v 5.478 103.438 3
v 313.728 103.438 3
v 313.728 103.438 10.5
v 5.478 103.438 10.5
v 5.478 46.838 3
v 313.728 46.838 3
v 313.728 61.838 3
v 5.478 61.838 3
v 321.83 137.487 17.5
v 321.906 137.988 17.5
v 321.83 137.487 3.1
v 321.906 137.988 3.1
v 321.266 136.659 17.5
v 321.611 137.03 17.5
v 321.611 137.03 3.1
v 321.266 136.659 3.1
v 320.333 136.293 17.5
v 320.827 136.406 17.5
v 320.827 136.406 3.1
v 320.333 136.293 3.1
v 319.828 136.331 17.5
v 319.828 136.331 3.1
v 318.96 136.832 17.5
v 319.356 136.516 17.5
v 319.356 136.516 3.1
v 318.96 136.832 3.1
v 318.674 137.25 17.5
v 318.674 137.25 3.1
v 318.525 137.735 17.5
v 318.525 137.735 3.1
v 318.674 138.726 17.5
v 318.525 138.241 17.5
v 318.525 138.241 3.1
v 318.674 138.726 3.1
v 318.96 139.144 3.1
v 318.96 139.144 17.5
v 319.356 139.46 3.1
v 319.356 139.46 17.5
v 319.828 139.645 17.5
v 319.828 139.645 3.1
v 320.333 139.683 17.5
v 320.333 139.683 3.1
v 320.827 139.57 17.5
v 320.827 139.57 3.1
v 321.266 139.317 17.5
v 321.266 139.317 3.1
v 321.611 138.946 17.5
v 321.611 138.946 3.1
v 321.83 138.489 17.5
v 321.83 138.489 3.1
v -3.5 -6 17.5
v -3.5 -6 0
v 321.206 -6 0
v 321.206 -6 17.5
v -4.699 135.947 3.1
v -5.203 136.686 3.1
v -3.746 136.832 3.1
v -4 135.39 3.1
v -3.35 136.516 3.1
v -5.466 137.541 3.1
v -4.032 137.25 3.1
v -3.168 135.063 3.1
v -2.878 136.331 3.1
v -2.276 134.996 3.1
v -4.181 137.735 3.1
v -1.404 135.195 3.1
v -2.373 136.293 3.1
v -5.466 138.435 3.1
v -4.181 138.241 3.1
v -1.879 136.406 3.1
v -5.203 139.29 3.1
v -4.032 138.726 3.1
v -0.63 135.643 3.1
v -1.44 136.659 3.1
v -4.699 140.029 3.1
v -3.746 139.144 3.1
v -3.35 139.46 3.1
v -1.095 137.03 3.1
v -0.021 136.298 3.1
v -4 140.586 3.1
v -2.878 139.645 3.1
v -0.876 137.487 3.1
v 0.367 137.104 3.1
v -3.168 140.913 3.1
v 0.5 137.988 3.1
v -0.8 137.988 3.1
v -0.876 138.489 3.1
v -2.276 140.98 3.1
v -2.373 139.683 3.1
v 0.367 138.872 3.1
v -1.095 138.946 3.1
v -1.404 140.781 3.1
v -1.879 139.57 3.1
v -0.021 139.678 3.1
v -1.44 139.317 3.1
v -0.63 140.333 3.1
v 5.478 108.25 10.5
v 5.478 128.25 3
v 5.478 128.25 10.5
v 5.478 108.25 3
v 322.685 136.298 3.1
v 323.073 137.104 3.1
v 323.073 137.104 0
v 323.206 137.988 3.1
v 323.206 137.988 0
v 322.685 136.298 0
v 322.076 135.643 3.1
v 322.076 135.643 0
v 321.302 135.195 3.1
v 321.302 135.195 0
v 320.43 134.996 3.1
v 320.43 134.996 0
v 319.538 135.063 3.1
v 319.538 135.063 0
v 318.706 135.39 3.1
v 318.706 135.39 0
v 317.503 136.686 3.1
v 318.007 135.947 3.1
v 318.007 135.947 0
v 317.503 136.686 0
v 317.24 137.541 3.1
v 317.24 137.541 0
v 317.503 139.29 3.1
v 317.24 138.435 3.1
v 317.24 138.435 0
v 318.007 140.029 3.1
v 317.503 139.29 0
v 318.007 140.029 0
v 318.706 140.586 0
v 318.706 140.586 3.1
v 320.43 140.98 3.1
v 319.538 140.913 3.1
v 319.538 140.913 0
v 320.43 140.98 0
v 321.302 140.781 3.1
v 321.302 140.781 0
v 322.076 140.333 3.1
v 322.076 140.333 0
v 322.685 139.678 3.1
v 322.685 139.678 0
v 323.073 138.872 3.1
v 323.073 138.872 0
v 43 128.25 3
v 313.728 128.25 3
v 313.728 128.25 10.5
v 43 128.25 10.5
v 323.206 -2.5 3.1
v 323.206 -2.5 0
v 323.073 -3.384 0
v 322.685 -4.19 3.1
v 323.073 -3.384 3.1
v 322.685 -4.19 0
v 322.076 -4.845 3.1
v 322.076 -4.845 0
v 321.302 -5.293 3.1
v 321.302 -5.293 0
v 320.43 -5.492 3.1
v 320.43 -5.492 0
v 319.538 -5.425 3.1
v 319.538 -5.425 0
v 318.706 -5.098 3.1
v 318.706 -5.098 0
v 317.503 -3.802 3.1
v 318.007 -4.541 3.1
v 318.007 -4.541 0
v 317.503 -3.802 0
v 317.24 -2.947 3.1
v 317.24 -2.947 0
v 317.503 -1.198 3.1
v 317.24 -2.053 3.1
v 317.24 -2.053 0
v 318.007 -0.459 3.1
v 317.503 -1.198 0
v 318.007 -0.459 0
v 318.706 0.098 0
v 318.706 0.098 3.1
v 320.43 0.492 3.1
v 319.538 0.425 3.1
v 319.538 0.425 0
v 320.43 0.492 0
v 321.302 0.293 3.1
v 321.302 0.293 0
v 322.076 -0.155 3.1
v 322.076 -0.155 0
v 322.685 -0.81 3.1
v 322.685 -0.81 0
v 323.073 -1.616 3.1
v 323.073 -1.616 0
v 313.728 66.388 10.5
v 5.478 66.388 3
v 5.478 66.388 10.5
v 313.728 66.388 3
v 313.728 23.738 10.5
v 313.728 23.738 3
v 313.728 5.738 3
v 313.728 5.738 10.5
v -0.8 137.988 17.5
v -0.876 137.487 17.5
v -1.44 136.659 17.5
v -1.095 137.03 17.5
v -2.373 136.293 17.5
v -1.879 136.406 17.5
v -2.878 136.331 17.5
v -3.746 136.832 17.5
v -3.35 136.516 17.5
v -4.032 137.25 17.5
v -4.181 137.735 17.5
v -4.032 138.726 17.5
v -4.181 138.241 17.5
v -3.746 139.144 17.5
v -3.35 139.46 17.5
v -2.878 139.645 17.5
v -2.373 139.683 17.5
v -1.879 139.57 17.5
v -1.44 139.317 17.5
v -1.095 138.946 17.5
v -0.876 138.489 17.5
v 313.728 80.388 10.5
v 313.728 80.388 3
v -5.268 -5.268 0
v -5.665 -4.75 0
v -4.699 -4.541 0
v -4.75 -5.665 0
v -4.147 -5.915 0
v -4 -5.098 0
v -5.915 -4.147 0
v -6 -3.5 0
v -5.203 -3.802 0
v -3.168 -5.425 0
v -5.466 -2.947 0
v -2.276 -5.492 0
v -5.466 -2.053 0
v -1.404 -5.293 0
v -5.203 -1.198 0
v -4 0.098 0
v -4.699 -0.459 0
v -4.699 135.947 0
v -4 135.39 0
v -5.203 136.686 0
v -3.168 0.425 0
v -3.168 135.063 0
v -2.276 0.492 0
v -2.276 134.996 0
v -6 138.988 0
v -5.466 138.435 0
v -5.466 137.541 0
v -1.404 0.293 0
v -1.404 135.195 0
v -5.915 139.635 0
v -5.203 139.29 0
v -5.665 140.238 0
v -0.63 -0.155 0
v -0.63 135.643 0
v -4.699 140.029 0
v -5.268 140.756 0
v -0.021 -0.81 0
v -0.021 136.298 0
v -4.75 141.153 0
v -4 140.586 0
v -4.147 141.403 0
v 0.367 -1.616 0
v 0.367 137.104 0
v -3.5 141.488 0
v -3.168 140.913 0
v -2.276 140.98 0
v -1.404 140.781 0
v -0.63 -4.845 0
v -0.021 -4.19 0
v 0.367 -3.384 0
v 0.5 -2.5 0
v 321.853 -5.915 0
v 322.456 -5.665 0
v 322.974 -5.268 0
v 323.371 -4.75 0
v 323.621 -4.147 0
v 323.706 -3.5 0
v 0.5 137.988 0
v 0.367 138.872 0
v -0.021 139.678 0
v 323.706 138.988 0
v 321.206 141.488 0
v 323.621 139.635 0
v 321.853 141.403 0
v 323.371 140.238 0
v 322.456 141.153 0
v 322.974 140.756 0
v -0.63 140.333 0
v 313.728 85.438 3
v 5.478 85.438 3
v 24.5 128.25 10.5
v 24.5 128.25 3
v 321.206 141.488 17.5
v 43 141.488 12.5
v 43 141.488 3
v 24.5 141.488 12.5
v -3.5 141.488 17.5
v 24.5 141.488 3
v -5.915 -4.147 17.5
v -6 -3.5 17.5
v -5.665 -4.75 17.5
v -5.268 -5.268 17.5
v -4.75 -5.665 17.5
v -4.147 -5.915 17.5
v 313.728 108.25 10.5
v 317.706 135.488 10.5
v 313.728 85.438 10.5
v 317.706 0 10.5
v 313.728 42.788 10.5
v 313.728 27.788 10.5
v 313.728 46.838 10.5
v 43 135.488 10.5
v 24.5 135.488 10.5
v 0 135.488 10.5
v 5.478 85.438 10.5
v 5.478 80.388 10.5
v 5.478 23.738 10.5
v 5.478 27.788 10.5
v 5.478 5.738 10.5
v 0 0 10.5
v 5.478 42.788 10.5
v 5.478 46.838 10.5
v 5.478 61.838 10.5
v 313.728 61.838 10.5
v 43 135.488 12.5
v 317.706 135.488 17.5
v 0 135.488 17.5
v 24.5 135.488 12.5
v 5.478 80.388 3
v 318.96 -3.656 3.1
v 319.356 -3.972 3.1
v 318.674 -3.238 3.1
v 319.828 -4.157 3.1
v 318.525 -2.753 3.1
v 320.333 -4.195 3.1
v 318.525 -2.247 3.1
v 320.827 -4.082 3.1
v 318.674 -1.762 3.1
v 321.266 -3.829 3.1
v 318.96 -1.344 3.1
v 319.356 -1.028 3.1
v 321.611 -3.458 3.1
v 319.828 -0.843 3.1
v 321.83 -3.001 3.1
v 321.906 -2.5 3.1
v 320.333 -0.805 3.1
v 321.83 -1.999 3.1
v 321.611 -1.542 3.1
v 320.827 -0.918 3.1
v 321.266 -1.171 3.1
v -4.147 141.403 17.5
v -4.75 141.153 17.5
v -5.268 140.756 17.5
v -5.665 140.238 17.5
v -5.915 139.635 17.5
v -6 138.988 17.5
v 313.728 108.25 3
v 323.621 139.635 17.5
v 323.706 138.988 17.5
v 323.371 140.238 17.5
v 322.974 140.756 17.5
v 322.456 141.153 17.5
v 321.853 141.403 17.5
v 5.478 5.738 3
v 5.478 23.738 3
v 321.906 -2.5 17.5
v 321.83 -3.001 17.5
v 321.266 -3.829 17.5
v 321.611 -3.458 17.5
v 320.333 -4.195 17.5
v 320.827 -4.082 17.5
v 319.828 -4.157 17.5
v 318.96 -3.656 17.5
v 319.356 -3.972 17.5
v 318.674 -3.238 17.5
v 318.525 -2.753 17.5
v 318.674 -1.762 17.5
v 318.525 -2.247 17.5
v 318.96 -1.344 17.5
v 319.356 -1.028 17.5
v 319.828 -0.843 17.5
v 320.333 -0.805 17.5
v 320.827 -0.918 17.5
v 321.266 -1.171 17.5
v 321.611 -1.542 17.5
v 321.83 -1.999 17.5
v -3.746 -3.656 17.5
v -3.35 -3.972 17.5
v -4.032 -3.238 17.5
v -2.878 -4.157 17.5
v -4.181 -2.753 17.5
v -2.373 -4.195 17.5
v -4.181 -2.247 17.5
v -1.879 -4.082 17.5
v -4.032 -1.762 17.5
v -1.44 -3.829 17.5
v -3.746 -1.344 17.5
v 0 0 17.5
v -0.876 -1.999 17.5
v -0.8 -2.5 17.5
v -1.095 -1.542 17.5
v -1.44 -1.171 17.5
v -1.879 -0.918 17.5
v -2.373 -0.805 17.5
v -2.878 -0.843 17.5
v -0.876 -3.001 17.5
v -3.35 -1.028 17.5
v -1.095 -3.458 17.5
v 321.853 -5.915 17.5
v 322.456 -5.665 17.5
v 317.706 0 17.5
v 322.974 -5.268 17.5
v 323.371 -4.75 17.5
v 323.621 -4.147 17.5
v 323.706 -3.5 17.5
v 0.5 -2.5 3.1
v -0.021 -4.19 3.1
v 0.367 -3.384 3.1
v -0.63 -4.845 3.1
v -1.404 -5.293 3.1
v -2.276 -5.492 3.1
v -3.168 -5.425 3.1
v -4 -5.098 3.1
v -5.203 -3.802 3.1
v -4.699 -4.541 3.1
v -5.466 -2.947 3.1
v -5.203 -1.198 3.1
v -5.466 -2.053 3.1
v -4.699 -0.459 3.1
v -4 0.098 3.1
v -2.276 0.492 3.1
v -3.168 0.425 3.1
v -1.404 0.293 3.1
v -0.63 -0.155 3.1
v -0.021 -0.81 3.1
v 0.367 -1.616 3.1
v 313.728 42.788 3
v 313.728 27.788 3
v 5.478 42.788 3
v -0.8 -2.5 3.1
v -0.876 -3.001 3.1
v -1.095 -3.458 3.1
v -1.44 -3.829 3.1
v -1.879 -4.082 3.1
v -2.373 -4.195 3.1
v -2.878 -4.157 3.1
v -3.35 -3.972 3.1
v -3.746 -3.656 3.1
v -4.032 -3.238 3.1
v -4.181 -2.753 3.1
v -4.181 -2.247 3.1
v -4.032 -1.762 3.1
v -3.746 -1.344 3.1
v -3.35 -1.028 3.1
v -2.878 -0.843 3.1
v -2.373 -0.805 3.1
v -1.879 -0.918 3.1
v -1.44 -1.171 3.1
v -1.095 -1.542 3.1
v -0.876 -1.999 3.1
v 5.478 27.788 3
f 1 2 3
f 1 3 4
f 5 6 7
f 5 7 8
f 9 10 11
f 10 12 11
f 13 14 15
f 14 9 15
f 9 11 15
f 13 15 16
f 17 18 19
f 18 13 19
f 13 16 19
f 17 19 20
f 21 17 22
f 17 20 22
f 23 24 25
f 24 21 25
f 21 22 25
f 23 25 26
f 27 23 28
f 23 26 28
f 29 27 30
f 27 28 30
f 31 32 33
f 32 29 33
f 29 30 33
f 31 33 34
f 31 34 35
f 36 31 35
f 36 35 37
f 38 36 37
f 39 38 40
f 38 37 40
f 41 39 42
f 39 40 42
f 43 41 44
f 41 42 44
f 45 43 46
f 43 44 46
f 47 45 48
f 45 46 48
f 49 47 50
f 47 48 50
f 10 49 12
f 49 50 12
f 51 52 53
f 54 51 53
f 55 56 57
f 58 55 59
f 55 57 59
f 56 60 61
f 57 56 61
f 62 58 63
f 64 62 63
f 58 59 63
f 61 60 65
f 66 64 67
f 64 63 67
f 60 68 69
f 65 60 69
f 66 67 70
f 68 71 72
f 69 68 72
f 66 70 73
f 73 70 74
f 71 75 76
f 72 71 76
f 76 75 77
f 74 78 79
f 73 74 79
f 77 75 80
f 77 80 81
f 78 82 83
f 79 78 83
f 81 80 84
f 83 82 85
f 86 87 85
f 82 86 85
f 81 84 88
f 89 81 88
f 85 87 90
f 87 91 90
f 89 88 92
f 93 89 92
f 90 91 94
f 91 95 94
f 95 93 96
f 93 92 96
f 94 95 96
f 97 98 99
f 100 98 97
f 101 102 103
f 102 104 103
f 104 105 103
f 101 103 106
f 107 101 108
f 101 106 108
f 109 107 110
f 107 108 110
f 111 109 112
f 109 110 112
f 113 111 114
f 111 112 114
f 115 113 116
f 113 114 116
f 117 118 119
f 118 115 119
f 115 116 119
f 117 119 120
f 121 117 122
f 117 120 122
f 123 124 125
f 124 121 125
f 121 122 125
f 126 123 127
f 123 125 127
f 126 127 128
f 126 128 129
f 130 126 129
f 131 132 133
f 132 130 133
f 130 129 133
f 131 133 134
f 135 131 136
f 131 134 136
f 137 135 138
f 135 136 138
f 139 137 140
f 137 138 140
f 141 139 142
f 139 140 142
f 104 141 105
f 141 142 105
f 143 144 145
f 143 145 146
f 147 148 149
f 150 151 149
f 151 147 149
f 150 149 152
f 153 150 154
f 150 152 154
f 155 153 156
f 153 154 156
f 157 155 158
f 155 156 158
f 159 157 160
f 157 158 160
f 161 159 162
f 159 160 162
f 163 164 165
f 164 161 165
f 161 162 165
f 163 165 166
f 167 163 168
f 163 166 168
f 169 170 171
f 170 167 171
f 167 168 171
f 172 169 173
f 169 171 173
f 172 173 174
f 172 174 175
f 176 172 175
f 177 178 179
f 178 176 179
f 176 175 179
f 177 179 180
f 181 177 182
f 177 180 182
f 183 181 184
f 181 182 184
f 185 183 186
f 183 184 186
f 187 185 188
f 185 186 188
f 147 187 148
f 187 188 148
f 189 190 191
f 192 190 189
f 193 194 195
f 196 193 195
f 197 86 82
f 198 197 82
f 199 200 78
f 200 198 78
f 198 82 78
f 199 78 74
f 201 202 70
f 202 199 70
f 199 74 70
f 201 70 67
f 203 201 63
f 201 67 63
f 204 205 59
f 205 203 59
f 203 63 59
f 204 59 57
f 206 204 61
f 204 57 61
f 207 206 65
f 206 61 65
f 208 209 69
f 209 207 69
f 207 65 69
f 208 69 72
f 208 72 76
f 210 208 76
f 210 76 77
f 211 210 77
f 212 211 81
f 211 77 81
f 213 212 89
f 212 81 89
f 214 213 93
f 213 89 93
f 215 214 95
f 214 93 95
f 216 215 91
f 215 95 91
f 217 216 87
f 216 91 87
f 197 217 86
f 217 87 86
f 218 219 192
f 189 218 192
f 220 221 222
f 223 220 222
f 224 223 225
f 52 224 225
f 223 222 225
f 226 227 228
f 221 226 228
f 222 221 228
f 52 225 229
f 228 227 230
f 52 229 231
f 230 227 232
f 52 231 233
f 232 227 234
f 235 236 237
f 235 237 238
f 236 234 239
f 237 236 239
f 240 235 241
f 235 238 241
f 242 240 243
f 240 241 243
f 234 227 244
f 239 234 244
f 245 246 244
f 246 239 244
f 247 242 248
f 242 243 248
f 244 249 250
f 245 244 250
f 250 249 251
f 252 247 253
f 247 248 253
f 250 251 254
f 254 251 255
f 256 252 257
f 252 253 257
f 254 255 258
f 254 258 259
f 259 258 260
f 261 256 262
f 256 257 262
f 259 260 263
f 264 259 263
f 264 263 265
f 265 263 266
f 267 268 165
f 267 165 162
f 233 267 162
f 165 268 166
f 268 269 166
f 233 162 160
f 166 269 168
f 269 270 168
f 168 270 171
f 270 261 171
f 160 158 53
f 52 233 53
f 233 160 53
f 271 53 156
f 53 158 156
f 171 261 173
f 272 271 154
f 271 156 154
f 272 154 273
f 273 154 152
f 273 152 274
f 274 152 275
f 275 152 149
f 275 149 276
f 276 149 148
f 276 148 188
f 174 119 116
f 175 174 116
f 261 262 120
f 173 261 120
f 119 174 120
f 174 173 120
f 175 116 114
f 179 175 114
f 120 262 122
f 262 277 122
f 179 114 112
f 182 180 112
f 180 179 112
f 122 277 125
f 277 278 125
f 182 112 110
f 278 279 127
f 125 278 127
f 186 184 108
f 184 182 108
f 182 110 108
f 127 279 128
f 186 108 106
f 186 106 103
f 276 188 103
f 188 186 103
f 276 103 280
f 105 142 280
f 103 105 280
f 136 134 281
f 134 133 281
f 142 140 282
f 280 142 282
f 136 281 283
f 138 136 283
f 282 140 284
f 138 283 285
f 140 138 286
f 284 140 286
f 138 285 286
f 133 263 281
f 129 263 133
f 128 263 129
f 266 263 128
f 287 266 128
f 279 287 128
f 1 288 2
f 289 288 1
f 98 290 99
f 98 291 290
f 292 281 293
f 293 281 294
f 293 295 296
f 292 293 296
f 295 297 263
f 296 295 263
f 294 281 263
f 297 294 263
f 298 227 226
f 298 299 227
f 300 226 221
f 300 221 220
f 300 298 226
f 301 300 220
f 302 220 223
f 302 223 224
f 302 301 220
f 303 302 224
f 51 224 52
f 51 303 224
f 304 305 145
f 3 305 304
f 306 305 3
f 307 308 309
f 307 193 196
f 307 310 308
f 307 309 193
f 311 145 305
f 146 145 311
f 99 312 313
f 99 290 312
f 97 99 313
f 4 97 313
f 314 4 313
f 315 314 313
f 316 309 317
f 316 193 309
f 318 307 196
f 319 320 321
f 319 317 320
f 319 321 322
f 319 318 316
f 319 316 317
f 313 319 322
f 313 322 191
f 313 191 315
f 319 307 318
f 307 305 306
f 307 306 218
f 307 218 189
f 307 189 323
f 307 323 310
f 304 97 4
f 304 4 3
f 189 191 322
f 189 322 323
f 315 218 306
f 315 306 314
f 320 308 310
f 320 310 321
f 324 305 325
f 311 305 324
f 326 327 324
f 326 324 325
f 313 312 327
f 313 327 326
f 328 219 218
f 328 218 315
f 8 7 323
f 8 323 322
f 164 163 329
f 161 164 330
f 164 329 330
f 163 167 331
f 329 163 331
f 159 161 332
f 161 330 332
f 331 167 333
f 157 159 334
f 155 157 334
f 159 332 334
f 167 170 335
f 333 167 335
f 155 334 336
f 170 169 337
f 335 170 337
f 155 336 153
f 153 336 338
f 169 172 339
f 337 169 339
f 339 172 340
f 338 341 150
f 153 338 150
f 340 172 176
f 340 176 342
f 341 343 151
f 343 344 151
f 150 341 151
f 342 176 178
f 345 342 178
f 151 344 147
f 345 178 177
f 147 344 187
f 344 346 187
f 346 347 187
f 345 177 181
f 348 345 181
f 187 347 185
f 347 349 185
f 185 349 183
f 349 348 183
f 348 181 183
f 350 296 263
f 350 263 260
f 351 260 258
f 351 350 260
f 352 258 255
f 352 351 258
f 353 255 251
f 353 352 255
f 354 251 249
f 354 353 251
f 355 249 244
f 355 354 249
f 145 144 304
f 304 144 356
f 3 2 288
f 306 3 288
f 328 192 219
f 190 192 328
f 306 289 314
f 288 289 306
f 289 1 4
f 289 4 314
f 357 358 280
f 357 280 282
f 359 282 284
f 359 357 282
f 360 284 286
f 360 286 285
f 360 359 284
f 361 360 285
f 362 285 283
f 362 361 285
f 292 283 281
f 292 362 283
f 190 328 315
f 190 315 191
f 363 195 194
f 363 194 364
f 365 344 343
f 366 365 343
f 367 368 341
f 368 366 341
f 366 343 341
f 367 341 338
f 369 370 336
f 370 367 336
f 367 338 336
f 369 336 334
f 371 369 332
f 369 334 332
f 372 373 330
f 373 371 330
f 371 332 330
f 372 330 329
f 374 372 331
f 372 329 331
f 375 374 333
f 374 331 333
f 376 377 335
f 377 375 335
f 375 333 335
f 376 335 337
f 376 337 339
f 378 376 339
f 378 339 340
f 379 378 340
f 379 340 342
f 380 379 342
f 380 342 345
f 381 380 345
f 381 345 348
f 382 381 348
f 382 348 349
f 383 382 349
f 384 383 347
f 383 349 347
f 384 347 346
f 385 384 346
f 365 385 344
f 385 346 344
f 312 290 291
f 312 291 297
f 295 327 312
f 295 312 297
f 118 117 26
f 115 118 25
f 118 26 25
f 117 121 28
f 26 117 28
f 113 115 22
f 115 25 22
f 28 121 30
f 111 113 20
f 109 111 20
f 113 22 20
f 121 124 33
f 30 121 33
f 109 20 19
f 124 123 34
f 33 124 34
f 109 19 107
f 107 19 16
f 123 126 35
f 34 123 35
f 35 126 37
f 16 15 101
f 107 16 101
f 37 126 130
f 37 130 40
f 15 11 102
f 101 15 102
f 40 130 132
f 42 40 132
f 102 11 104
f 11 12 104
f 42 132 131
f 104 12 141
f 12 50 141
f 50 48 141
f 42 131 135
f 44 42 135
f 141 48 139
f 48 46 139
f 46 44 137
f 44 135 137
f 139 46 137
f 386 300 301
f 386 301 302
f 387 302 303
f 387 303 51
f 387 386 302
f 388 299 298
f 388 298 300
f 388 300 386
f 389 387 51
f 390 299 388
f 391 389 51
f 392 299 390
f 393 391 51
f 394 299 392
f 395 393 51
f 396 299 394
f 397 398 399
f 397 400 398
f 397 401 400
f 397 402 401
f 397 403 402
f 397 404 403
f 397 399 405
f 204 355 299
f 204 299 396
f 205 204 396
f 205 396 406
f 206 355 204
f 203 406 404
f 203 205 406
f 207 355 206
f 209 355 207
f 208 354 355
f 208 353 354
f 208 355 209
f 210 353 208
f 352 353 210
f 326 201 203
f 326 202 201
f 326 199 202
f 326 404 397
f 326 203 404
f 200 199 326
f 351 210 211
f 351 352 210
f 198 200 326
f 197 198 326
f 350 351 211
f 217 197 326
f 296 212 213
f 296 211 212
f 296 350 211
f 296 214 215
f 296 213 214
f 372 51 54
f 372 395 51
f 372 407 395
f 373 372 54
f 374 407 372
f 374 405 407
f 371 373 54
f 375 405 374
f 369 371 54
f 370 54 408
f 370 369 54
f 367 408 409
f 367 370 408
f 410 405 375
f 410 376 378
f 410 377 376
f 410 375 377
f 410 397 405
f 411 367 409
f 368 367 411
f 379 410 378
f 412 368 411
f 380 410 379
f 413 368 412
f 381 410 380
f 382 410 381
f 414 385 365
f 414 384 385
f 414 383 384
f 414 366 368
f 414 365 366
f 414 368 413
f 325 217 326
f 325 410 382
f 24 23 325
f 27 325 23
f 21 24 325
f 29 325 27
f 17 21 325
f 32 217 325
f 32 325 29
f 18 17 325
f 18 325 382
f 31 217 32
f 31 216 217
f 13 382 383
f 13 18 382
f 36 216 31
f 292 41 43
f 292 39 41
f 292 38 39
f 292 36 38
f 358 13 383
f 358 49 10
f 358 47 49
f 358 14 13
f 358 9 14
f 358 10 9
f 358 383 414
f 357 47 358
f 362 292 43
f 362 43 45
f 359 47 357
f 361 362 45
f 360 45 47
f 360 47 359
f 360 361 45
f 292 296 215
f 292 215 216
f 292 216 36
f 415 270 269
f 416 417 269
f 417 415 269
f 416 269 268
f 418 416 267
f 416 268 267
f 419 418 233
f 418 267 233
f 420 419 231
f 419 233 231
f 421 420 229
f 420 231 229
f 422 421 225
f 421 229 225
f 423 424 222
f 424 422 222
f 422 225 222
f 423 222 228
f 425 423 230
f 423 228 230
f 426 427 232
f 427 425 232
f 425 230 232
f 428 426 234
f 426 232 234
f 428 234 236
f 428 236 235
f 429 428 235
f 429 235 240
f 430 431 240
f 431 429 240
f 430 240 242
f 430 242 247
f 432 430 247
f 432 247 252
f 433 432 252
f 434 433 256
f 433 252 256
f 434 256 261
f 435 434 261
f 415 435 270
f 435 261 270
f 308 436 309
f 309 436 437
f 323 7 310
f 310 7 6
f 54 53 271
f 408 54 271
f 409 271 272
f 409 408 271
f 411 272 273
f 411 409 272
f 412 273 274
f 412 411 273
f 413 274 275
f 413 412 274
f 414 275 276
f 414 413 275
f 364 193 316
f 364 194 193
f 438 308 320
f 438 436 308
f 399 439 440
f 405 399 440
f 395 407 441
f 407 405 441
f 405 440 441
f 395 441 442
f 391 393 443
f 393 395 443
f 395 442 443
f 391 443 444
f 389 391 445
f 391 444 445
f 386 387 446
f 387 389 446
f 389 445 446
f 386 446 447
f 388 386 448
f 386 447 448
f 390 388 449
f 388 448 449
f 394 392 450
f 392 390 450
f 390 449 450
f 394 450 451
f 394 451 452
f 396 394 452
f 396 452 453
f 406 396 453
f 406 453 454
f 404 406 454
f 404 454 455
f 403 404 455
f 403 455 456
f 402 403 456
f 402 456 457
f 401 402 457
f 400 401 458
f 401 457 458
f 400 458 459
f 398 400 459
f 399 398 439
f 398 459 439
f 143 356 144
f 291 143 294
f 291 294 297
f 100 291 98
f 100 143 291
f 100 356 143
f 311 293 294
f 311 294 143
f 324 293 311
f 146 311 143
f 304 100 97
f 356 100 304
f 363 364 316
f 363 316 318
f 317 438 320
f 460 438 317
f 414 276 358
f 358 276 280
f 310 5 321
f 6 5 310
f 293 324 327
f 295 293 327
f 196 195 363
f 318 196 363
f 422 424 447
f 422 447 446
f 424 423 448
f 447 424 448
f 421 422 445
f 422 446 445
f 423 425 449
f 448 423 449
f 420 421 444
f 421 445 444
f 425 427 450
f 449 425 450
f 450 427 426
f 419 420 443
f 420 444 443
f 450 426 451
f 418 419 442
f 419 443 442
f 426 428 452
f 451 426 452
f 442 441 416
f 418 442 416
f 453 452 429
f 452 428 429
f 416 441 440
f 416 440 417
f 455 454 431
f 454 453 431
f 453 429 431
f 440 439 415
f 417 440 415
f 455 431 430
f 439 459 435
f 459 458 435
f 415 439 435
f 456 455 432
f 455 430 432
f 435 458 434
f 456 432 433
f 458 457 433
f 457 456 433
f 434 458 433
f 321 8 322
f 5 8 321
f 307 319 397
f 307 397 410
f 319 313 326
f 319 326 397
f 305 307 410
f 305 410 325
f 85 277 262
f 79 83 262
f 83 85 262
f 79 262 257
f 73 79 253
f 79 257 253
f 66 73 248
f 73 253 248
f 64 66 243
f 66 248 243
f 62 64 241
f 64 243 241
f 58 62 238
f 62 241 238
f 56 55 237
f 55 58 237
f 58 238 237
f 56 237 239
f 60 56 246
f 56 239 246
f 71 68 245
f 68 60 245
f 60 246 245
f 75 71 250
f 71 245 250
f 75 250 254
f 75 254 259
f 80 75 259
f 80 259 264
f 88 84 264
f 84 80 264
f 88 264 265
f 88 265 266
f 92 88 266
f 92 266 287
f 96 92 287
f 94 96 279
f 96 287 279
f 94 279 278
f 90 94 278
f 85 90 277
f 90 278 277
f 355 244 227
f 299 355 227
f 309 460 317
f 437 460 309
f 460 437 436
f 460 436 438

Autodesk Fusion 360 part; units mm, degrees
sketch "Sketch1" plane through (0, 0, 0) normal (0, 0, 1) x (1, 0, 0) in component "MechKeyboard"
  line L0 (0, 0) -> (317.706, 0)
  line L1 (317.706, 0) -> (317.706, 135.488)
  line L2 (317.706, 135.488) -> (0, 135.488)
  line L3 (0, 135.488) -> (0, 0)
  line L4 (-6, -6) -> (323.706, -6)
  line L5 (323.706, -6) -> (323.706, 141.488)
  line L6 (323.706, 141.488) -> (-6, 141.488)
  line L7 (-6, 141.488) -> (-6, -6)
  circle A0 centre (320.206, 137.988) radius 1.7
  circle A1 centre (320.206, 137.988) radius 3
  line L8 (158.853, 135.488) -> (158.853, 141.488) construction
  line L9 (317.706, 67.744) -> (323.706, 67.744) construction
  circle A2 centre (320.206, -2.5) radius 3
  circle A3 centre (320.206, -2.5) radius 1.7
  circle A4 centre (-2.5, 137.988) radius 1.7
  circle A5 centre (-2.5, 137.988) radius 3
  circle A6 centre (-2.5, -2.5) radius 1.7
  circle A7 centre (-2.5, -2.5) radius 3
  dimension "d1" = 317.706
  dimension "d2" = 135.488
  dimension "d3" = 6
  dimension "d4" = 3.4
  dimension "d5" = 3.5
  dimension "d6" = 3.5
  dimension "d7" = 6
extrude "Extrude1" add sketch "Sketch1" along normal blind 14.4 from surface at 3.1 contours A1 | A2 | A5 | A7 makes body 1 at (0.4851, -2.7987, 7.9) makes body 2 at (318.8374, 0.1696, 12.7) makes body 3 at (-5.3191, 139.0141, 12.7) makes body 4 at (321.4399, 140.7225, 12.7) in component "MechKeyboard"
extrude "Extrude2" add sketch "Sketch1" along normal blind 17.5 contours L4 L5 L6 L7 bodies 1 2 3 4 in component "MechKeyboard"
extrude "Extrude3" add sketch "Sketch1" along normal blind 3 contours L0 L1 L2 L3 bodies 1 in component "MechKeyboard"
sketch "Sketch1 (2)" plane through (0, 0, 17.5) normal (0, 0, 1) x (-1, 0, 0)
  line L0 (0, 0) -> (0, -135.488)
  line L1 (0, -135.488) -> (-317.706, -135.488)
  line L2 (-317.706, -135.488) -> (-317.706, 0)
  line L3 (-317.706, 0) -> (0, 0)
  line L4 (6, -141.488) -> (6, 6)
  line L5 (6, 6) -> (-323.706, 6)
  line L6 (-323.706, 6) -> (-323.706, -141.488)
  line L7 (-323.706, -141.488) -> (6, -141.488)
  line L8 (-24.5, -141.488) -> (-43, -141.488)
  line L9 (-43, -141.488) -> (-43, -135.488)
  line L10 (-43, -135.488) -> (-24.5, -135.488)
  line L11 (-24.5, -135.488) -> (-24.5, -141.488)
  circle A0 centre (2.5, 2.5) radius 1.7
  circle A1 centre (-320.206, -137.988) radius 1.7
  circle A2 centre (-320.206, 2.5) radius 1.7
  circle A3 centre (2.5, -137.988) radius 1.7
  dimension "d15" = 18.5
  dimension "d17" = 24.5
extrude "Extrude4" cut sketch "Sketch1 (2)" against normal up to surface (9.5 mm away) from surface at -5 contours L1 L7 L8 L9 L10 L11 bodies 1 in component "MechKeyboard"
fillet "Fillet1" radius 2.5 4 edges at (-6, 141.488, 8.75) (-6, -6, 8.75) (323.706, -6, 8.75) (323.706, 141.488, 8.75) on bodies 1 in component "MechKeyboard"
sketch "Sketch2" plane through (0, 0, 3) normal (0, 0, 1) x (-1, 0, 0)
  curve L0
  curve A0
  curve A1
  curve A2
  curve A3
  curve A4
  curve A5
  curve A6
  curve A7
  curve A8
  curve A9
  curve A10
  curve A11
  curve A12
  curve A13
  curve A14
  curve A15
  curve A16
  curve A17
  curve A18
  curve A19
  curve A20
  curve A21
  curve A22
  curve A23
  curve A24
  curve A25
  curve A26
  curve A27
  curve A28
  curve A29
  curve A30
  curve A31
  curve A32
  curve A33
  curve A34
  curve A35
  curve A36
  curve A37
  curve A38
  curve A39
  curve A40
  curve A41
  curve A42
  curve A43
  curve A44
  curve A45
  curve A46
  curve A47
  curve A48
  curve A49
  curve A50
  curve A51
  curve A52
  curve A53
  curve A54
  curve A55
  curve A56
  curve A57
  curve A58
  curve A59
  curve A60
  curve A61
  curve A62
  curve A63
  curve A64
  curve A65
  curve A66
  curve A67
  curve A68
  curve A69
  curve A70
  curve A71
  curve A72
  curve A73
  curve A74
  curve A75
  curve L1
  curve L2
  curve A76
  curve A77
  curve A78
  curve L3
  curve A79
  curve L4
  curve A80
  curve A81
  curve A82
  curve L5
  curve L6
  curve L7
  curve A83
  curve L8
  curve A84
  curve A85
  curve L9
  curve L10
  curve L11
  curve L12
  curve L13
  curve A86
  curve L14
  curve L15
  curve L16
  curve L17
  curve L18
  curve L19
  curve A87
  curve A88
  curve L20
  curve L21
  curve L22
  curve A89
  curve A90
  curve L23
  curve L24
  curve L25
  curve L26
  curve L27
  curve L28
  curve L29
  curve L30
  curve L31
  curve L32
  curve L33
  curve L34
  curve L35
  curve L36
  curve L37
  curve L38
  curve L39
  curve L40
  curve L41
  curve L42
  curve L43
  curve L44
  curve L45
  curve L46
  curve L47
  curve L48
  curve L49
  curve L50
  curve L51
  curve L52
  curve L53
  curve L54
  curve L55
  curve L56
  curve L57
  curve L58
  curve A91
  curve A92
  curve A93
  curve L59
  curve A94
  curve A95
  curve A96
  curve A97
  curve A98
  curve A99
  curve A100
  curve A101
  curve A102
  curve A103
  curve A104
  curve A105
  curve A106
  curve A107
  curve A108
  curve A109
  curve A110
  curve A111
  curve A112
  curve A113
  curve L60
  curve A114
  curve A115
  curve A116
  curve A117
  curve A118
  curve A119
  curve A120
  curve A121
  curve A122
  curve A123
  curve A124
  curve A125
  curve A126
  curve A127
  curve A128
  curve A129
  curve A130
  curve A131
  curve A132
  curve A133
  curve L61
  curve A134
  curve A135
  curve A136
  curve A137
  curve A138
  curve A139
  curve A140
  curve A141
  curve A142
  curve A143
  curve A144
  curve A145
  curve A146
  curve A147
  curve L62
  curve A148
  curve A149
  curve A150
  curve A151
  curve A152
  curve L63
  curve L64
  curve L65
  curve A153
  curve A154
  curve A155
  curve L66
  curve L67
  curve L68
  curve L69 construction
  curve L70
  curve A156
  curve L71
  curve L72
  curve L73
  curve A157
  curve L74
  curve L75
  curve L76
  curve L77
  curve L78
  curve L79
  curve L80
  curve L81
  curve L82
  curve L83
  curve L84
  curve L85
  curve L86
  curve L87
  curve L88
  curve L89
  curve L90
  curve A158
  curve A159
  curve L91
  curve A160
  curve A161
  curve A162
  curve L92
  curve A163
  curve A164
  curve A165
  curve A166
  curve A167
  curve L93
  curve A168
  curve L94
  curve A169
  curve A170
  curve L95
  curve A171
  curve L96
  curve L97
  curve A172
  curve L98
  curve L99
  curve L100
  curve L101
  curve L102
  curve L103
  curve L104
  curve L105
  curve L106
  curve L107
  curve L108
  curve L109
  curve L110
  curve L111
  curve L112
  curve L113
  curve L114
  curve L115
  curve L116
  curve L117
  curve L118
  curve L119
  curve L120
  curve L121
  curve L122
  curve L123
  curve L124
  curve L125
  curve L126
  curve L127
  curve L128
  curve L129
  curve L130
  curve L131
  curve L132
  curve L133
  curve L134
  curve L135
  curve L136
  curve L137
  curve L138
  curve L139
  curve L140
  curve L141
  curve L142
  curve L143
  curve L144
  curve L145
  curve A173
  curve A174
  curve A175
  curve L146
  curve L147
  curve L148
  curve A176
  curve A177
  curve L149
  curve A178
  curve L150
  curve A179
  curve A180
  curve A181
  curve L151
  curve A182
  curve L152
  curve L153
  curve L154
  curve A183
  curve A184
  curve A185
  curve L155
  curve L156
  curve A186
  curve A187
  curve L157
  curve A188
  curve L158
  curve L159
  curve A189
  curve A190
  curve L160
  curve A191
  curve A192
  curve L161
  curve A193
  curve L162
  curve L163
  curve A194
  curve A195
  curve A196
  curve A197
  curve A198
  curve L164
  curve A199
  curve L165
  curve L166
  curve A200
  curve L167
  curve A201
  curve A202
  curve L168
  curve L169
  curve A203
  curve A204
  curve L170
  curve A205
  curve A206
  curve A207
  curve L171
  curve L172
  curve L173
  curve L174
  curve L175
  curve L176
  curve A208
  curve L177
  curve A209
  curve L178
  curve L179
  curve L180
  curve L181
  curve L182
  curve L183
  curve L184
  curve L185
  curve L186
  curve L187
  curve L188
  curve A210
  curve L189
  curve L190
  curve L191 construction
  curve L192
  curve A211
  curve A212
  curve L193
  curve L194
  curve L195
  curve L196
  curve L197
  curve L198
  curve A213
  curve A214
  curve L199
  curve L200
  curve A215
  curve A216
  curve A217
  curve A218
  curve L201
  curve L202
  curve L203
  curve L204
  curve A219
  curve L205
  curve L206 construction
  curve A220
  curve L207 construction
  curve A221
  curve A222
  curve A223
  curve L208
  curve A224
  curve A225
  curve A226
  curve L209
  curve L210
  curve A227
  curve A228
  curve A229
  curve A230
  curve A231
  curve L211
  curve A232
  curve A233
  curve A234
  curve A235
  curve L212
  curve L213
  curve L214
  curve L215
  curve L216
  curve A236
  curve A237
  curve A238
  curve L217
  curve L218 construction
  curve L219
  curve A239
  curve L220
  curve L221
  curve A240
  curve A241
  curve L222
  curve A242
  curve A243
  curve A244
  curve L223
  curve A245
  curve L224
  curve L225
  curve L226
  curve A246
  curve L227
  curve L228
  curve L229
  curve A247
  curve L230
  curve A248
  curve L231
  curve L232
  curve A249
  curve L233
  curve L234
  curve L235
  curve L236
  curve L237
  curve L238
  curve L239
  curve A250
  curve A251
  curve L240
  curve A252
  curve L241
  curve A253
  curve L242
  curve A254
  curve L243
  curve L244
  curve L245
  curve A255
  curve A256
  curve L246
  curve L247
  curve L248
  curve L249
  curve A257
  curve A258
  curve L250
  curve L251
  curve L252
  curve A259
  curve A260
  curve A261
  curve L253
  curve A262
  curve L254
  curve A263
  curve L255
  curve A264
  curve L256
  curve A265
  curve L257
  curve A266
  curve L258
  curve A267
  curve A268
  curve L259
  curve A269
  curve A270
  curve L260
  curve L261
  curve A271
  curve L262
  curve A272
  curve A273
  curve L263
  curve L264
  curve A274
  curve L265
  curve L266
  curve L267
  curve L268
  curve A275
  curve L269
  curve A276
  curve L270
  curve A277
  curve A278
  curve A279
  curve A280
  curve L271
  curve A281
  curve L272
  curve L273
  curve L274
  curve L275
  curve A282
  curve L276
  curve L277
  curve L278
  curve L279
  curve L280
  curve L281 construction
  curve A283
  curve L282
  curve A284
  curve L283
  curve L284
  curve A285
  curve L285
  curve L286
  curve A286
  curve L287
  curve A287
  curve A288
  curve L288
  curve L289
  curve A289
  curve A290
  curve A291
  curve A292
  curve L290
  curve L291
  curve L292
  curve L293
  curve A293
  curve L294
  curve L295
  curve A294
  curve L296
  curve L297
  curve L298
  curve A295
  curve L299
  curve L300
  curve A296
  curve L301
  curve L302
  curve L303
  curve L304
  curve L305
  curve A297
  curve A298
  curve L306
  curve A299
  curve A300
  curve A301
  curve A302
  curve L307
  curve A303
  curve L308
  curve A304
  curve A305
  curve L309
  curve L310
  curve L311
  curve A306
  curve A307
  curve L312
  curve L313
  curve A308
  curve L314
  curve A309
  curve A310
  curve L315
  curve L316
  curve A311
  curve L317
  curve L318
  curve A312
  curve L319
  curve L320
  curve A313
  curve L321
  curve L322
  curve A314
  curve A315
  curve L323
  curve A316
  curve A317
  curve L324
  curve L325
  curve A318
  curve L326
  curve L327
  curve L328
  curve L329
  curve A319
  curve A320
  curve A321
  curve L330
  curve A322
  curve L331
  curve L332
  curve L333
  curve L334
  curve A323
  curve A324
  curve A325
  curve A326
  curve L335
  curve A327
  curve L336
  curve A328
  curve A329
  curve L337
  curve L338
  curve L339
  curve L340
  curve L341
  curve A330
  curve A331
  curve L342
  curve L343
  curve A332
  curve L344
  curve A333
  curve A334
  curve L345
  curve L346
  curve L347
  curve A335
  curve A336
  curve L348
  curve A337
  curve A338
  curve L349
  curve L350
  curve L351
  curve A339
  curve A340
  curve L352
  curve L353
  curve A341
  curve L354
  curve A342
  curve A343
  curve A344
  curve A345
  curve A346
  curve A347
  curve A348
  curve L355
  curve A349
  curve L356
  curve L357
  curve A350
  curve L358
  curve L359
  curve L360
  curve L361
  curve A351
  curve A352
  curve L362
  curve A353
  curve A354
  curve L363
  curve A355
  curve A356
  curve A357
  curve A358
  curve L364
  curve L365
  curve A359
  dimension "d35" = 329.706
  dimension "d36" = 147.488
  dimension "d37" = 6
  dimension "d38" = 3.5
  dimension "d39" = 3.5
sketch "Sketch4" plane through (0, 0, 13) normal (0, 0, 1) x (-1, 0, 0)
  line L0 (0, -135.488) -> (-317.706, -135.488)
  line L1 (-317.706, -135.488) -> (-317.706, -128.2503)
  line L2 (-317.706, -128.2503) -> (0, -128.2503)
  line L3 (0, -128.2503) -> (0, -135.488)
  line L4 (-9.478, -124.7503) -> (-22.478, -124.7503)
  line L5 (0, -108.2503) -> (-317.706, -108.2503)
  line L6 (-317.706, -108.2503) -> (-317.706, -103.4378)
  line L7 (-317.706, -103.4378) -> (0, -103.4378)
  line L8 (0, -103.4378) -> (0, -108.2503)
  line L9 (0, 0) -> (0, -135.488)
  line L10 (-317.706, -135.488) -> (-317.706, 0)
  line L11 (-9.478, -110.7503) -> (-22.478, -110.7503)
  line L12 (-9.478, -100.9378) -> (-22.478, -100.9378)
  line L13 (0, -135.488) -> (-5.478, -135.488)
  line L14 (-5.478, -135.488) -> (-5.478, 0)
  line L15 (-5.478, 0) -> (0, 0)
  line L16 (0, 0) -> (0, -135.488)
  line L17 (-317.706, 0) -> (0, 0)
  line L18 (-8.978, -124.2503) -> (-8.978, -111.2503)
  line L19 (-317.706, -135.488) -> (-313.728, -135.488)
  line L20 (-313.728, -135.488) -> (-313.728, 0)
  line L21 (-313.728, 0) -> (-317.706, 0)
  line L22 (-317.706, 0) -> (-317.706, -135.488)
  line L23 (-308.728, -24.2378) -> (-308.728, -11.2378)
  line L24 (0, 0) -> (-317.706, 0)
  line L25 (-317.706, 0) -> (-317.706, -5.7378)
  line L26 (-317.706, -5.7378) -> (0, -5.7378)
  line L27 (0, -5.7378) -> (0, 0)
  line L28 (-11.8593, -10.7378) -> (-24.8593, -10.7378)
  line L29 (0, -85.4378) -> (-317.706, -85.4378)
  line L30 (-317.706, -85.4378) -> (-317.706, -80.3878)
  line L31 (-317.706, -80.3878) -> (0, -80.3878)
  line L32 (0, -80.3878) -> (0, -85.4378)
  line L33 (-14.2405, -81.8878) -> (-27.2405, -81.8878)
  line L34 (-9.478, -86.9378) -> (-22.478, -86.9378)
  line L35 (0, -66.3878) -> (-317.706, -66.3878)
  line L36 (-317.706, -66.3878) -> (-317.706, -61.8378)
  line L37 (-317.706, -61.8378) -> (0, -61.8378)
  line L38 (0, -61.8378) -> (0, -66.3878)
  line L39 (-14.2405, -67.8878) -> (-27.2405, -67.8878)
  line L40 (-16.6218, -62.8378) -> (-29.6218, -62.8378)
  line L41 (0, -46.8378) -> (-317.706, -46.8378)
  line L42 (-317.706, -46.8378) -> (-317.706, -42.7878)
  line L43 (-317.706, -42.7878) -> (0, -42.7878)
  line L44 (0, -42.7878) -> (0, -46.8378)
  line L45 (-16.6218, -48.8378) -> (-29.6218, -48.8378)
  line L46 (-21.3843, -43.7878) -> (-34.3843, -43.7878)
  line L47 (0, -27.7878) -> (-317.706, -27.7878)
  line L48 (-317.706, -27.7878) -> (-317.706, -23.7378)
  line L49 (-317.706, -23.7378) -> (0, -23.7378)
  line L50 (0, -23.7378) -> (0, -27.7878)
  line L51 (-12.9463, -27.7878) -> (-18.9463, -27.7878)
  line L52 (-11.8593, -24.7378) -> (-24.8593, -24.7378)
  line L53 (-21.3843, -29.7878) -> (-34.3843, -29.7878)
  line L54 (-24.5, -135.488) -> (-43, -135.488)
  line L55 (-43, -135.488) -> (-43, -128.2503)
  line L56 (-43, -128.2503) -> (-24.5, -128.2503)
  line L57 (-24.5, -128.2503) -> (-24.5, -135.488)
  point P0 (-24.5, -135.488)
  point P1 (-43, -135.488)
  point P2 (-317.706, -135.488)
  point P3 (0, -135.488)
  dimension "d40" = 3.5
  dimension "d41" = 2.5
  dimension "d42" = 2.5
  dimension "d43" = 3.5
  dimension "d44" = 5
  dimension "d45" = 5
  dimension "d46" = 1.5
  dimension "d47" = 1.5
  dimension "d48" = 1.5
  dimension "d49" = 1
  dimension "d50" = 2
  dimension "d51" = 1
  dimension "d53" = 1
  dimension "d54" = 2
extrude "Extrude5" add sketch "Sketch4" along normal blind 10 from surface at -12.5 contours L0 L2 L3 L9 L13 L14 L16 | L0 L2 L14 L57 | L2 L5 L9 L14 L16 | L5 L7 L8 L9 L14 L16 | L0 L2 L20 L55 | L5 L7 L14 L20 | L7 L9 L14 L16 L29 | L0 L1 L2 L10 L19 L20 L22 | L2 L5 L10 L20 L22 | L5 L6 L7 L10 L20 L22 | L9 L14 L16 L29 L31 L32 | L7 L10 L20 L22 L29 | L14 L20 L29 L31 | L9 L14 L16 L31 L35 | L10 L20 L22 L29 L30 L31 | L9 L14 L16 L35 L37 L38 | L10 L20 L22 L31 L35 | L14 L20 L35 L37 | L9 L14 L16 L37 L41 | L10 L20 L22 L35 L36 L37 | L9 L14 L16 L41 L43 L44 | L10 L20 L22 L37 L41 | L14 L20 L41 L43 | L9 L14 L16 L43 L47 | L10 L20 L22 L41 L42 L43 | L9 L14 L16 L47 L49 L50 | L10 L20 L22 L43 L47 | L14 L20 L47 L49 L51 | L9 L14 L16 L26 L49 | L10 L20 L22 L47 L48 L49 | L9 L14 L15 L16 L17 L24 L26 L27 | L10 L20 L22 L26 L49 | L14 L17 L20 L24 L26 | L10 L17 L20 L21 L22 L24 L25 L26 bodies 1 in component "MechKeyboard"
component "MechKeyboard" placed x (1, 0, 0) y (0, 1, 0) z (0, 0, 1) at (0, 0, 0)
equation "d9 = 17.5 mm - 3.1 mm"
